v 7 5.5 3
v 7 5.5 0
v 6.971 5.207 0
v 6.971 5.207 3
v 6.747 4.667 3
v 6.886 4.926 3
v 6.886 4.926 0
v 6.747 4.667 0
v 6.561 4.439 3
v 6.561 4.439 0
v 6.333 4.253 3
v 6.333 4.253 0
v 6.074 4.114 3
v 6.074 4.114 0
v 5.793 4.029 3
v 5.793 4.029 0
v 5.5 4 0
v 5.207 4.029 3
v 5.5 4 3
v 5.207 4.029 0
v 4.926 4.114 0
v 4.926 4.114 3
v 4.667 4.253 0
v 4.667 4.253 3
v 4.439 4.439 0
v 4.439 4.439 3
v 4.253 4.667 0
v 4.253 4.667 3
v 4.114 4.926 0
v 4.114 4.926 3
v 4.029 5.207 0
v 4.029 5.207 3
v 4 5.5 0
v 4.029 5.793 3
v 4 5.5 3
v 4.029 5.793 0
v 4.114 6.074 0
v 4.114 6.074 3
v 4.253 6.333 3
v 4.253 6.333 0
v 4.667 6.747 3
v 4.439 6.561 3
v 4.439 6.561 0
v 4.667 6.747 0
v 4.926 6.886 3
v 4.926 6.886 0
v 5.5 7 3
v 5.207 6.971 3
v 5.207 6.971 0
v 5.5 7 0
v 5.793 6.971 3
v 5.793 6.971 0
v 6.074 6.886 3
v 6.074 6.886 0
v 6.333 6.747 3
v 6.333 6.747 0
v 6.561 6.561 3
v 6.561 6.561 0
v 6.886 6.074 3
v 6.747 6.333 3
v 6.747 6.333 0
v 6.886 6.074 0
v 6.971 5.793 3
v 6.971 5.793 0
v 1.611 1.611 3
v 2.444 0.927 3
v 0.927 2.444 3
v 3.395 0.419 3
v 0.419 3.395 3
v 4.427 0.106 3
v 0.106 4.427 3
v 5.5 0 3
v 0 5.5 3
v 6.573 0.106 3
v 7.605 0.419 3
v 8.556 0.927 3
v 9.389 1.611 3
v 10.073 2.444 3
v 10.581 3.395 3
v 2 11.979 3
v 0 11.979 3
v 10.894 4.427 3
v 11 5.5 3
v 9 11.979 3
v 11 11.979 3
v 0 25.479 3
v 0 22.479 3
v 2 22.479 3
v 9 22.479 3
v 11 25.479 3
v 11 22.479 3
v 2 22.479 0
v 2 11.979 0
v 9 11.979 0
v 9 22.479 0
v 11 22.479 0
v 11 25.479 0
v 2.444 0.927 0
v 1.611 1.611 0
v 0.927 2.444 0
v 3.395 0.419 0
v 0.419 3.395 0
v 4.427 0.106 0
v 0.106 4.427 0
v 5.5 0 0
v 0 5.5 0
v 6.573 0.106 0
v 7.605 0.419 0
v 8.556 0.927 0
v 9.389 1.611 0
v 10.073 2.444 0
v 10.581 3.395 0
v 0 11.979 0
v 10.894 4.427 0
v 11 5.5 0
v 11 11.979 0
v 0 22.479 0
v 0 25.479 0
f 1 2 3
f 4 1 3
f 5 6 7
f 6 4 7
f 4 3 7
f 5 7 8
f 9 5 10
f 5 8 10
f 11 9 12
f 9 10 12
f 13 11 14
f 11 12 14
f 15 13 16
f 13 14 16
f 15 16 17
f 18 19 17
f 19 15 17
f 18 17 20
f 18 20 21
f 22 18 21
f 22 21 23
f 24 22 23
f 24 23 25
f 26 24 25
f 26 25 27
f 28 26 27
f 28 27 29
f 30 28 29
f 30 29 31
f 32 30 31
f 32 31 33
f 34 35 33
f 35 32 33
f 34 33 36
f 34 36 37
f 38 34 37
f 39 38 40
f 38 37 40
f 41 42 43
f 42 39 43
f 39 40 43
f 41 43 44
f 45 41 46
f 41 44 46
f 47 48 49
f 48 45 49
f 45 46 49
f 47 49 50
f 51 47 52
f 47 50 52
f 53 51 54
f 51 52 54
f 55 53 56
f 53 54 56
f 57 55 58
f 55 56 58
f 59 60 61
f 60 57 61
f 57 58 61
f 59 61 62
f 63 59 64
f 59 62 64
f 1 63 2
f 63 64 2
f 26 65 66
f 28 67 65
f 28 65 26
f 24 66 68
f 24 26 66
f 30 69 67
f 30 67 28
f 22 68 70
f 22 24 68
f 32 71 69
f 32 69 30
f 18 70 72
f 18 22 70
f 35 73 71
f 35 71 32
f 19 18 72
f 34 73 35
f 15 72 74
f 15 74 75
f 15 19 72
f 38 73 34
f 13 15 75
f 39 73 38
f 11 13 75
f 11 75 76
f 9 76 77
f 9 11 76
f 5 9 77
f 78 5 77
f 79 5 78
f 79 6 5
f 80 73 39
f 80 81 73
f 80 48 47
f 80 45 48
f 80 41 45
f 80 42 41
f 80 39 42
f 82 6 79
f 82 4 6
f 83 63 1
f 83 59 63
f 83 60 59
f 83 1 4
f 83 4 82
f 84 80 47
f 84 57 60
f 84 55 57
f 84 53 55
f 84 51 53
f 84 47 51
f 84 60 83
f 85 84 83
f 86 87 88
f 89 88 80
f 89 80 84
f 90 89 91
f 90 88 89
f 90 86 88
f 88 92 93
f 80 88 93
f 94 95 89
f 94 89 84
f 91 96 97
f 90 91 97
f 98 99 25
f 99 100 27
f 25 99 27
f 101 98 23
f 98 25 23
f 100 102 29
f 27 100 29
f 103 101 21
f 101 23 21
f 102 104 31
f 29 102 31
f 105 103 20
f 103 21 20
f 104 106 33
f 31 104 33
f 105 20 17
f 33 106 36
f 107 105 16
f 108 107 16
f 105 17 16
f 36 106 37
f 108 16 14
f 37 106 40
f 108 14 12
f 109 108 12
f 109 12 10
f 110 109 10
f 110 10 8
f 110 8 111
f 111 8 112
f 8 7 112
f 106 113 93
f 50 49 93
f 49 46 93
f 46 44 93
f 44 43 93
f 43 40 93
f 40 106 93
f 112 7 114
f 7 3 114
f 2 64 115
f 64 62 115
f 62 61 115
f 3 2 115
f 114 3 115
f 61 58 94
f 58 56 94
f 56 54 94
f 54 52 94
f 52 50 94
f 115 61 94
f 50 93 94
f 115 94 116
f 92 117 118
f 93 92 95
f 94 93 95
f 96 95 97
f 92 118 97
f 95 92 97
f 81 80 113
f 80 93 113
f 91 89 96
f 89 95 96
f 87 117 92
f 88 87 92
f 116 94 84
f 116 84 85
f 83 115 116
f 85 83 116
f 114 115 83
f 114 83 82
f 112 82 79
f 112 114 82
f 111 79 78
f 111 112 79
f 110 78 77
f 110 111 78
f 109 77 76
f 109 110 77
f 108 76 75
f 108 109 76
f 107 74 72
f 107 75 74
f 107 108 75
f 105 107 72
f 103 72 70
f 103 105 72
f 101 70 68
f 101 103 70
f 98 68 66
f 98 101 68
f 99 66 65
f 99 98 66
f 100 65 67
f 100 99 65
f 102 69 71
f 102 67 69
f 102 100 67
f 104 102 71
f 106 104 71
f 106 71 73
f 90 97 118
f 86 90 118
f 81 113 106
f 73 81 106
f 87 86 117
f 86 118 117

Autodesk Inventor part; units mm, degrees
ref_plane "YZ Plane" through (0, 0, 0) normal (1, 0, 0) x (0, 1, 0)
ref_plane "XZ Plane" through (0, 0, 0) normal (0, 1, 0) x (-1, 0, 0)
ref_plane "XY Plane" through (0, 0, 0) normal (0, 0, 1) x (1, 0, 0)
sketch "Sketch6" plane through (0, 0, 0) normal (0, 0, 1) x (1, 0, 0)
  line L0 (11, 25.4786) -> (0, 25.4786)
  line L1 (2, 22.4786) -> (2, 11.9786)
  line L2 (9, 22.4786) -> (9, 11.9786)
  line L3 (2, 11.9786) -> (0, 11.9786)
  line L4 (9, 11.9786) -> (11, 11.9786)
  arc A0 (0, 5.5) -> (11, 5.5) centre (5.5, 5.5) ccw
  circle A1 centre (5.5, 5.5) radius 1.5
  line L5 (0, 22.4786) -> (2, 22.4786)
  line L6 (9, 22.4786) -> (11, 22.4786)
  line L7 (0, 25.4786) -> (0, 22.4786)
  line L8 (0, 11.9786) -> (0, 5.5)
  line L9 (11, 5.5) -> (11, 11.9786)
  line L10 (11, 22.4786) -> (11, 25.4786)
  point P0 (0, 0)
  point P1 (10, 11.9786)
  dimension "d92" = 10.5
  dimension "d93" = 10.5
  dimension "d94" = 2
  dimension "d95" = 2
  dimension "d96" = 3
  dimension "d97" = 11
  dimension "d98" = 6.4786
extrude "Extrusion3" add sketch "Sketch6" along normal blind 3
properties part number "4P.01.02.27-BC-v1-Final Aileron L2 80deg" material "Acrylic, Clear"
